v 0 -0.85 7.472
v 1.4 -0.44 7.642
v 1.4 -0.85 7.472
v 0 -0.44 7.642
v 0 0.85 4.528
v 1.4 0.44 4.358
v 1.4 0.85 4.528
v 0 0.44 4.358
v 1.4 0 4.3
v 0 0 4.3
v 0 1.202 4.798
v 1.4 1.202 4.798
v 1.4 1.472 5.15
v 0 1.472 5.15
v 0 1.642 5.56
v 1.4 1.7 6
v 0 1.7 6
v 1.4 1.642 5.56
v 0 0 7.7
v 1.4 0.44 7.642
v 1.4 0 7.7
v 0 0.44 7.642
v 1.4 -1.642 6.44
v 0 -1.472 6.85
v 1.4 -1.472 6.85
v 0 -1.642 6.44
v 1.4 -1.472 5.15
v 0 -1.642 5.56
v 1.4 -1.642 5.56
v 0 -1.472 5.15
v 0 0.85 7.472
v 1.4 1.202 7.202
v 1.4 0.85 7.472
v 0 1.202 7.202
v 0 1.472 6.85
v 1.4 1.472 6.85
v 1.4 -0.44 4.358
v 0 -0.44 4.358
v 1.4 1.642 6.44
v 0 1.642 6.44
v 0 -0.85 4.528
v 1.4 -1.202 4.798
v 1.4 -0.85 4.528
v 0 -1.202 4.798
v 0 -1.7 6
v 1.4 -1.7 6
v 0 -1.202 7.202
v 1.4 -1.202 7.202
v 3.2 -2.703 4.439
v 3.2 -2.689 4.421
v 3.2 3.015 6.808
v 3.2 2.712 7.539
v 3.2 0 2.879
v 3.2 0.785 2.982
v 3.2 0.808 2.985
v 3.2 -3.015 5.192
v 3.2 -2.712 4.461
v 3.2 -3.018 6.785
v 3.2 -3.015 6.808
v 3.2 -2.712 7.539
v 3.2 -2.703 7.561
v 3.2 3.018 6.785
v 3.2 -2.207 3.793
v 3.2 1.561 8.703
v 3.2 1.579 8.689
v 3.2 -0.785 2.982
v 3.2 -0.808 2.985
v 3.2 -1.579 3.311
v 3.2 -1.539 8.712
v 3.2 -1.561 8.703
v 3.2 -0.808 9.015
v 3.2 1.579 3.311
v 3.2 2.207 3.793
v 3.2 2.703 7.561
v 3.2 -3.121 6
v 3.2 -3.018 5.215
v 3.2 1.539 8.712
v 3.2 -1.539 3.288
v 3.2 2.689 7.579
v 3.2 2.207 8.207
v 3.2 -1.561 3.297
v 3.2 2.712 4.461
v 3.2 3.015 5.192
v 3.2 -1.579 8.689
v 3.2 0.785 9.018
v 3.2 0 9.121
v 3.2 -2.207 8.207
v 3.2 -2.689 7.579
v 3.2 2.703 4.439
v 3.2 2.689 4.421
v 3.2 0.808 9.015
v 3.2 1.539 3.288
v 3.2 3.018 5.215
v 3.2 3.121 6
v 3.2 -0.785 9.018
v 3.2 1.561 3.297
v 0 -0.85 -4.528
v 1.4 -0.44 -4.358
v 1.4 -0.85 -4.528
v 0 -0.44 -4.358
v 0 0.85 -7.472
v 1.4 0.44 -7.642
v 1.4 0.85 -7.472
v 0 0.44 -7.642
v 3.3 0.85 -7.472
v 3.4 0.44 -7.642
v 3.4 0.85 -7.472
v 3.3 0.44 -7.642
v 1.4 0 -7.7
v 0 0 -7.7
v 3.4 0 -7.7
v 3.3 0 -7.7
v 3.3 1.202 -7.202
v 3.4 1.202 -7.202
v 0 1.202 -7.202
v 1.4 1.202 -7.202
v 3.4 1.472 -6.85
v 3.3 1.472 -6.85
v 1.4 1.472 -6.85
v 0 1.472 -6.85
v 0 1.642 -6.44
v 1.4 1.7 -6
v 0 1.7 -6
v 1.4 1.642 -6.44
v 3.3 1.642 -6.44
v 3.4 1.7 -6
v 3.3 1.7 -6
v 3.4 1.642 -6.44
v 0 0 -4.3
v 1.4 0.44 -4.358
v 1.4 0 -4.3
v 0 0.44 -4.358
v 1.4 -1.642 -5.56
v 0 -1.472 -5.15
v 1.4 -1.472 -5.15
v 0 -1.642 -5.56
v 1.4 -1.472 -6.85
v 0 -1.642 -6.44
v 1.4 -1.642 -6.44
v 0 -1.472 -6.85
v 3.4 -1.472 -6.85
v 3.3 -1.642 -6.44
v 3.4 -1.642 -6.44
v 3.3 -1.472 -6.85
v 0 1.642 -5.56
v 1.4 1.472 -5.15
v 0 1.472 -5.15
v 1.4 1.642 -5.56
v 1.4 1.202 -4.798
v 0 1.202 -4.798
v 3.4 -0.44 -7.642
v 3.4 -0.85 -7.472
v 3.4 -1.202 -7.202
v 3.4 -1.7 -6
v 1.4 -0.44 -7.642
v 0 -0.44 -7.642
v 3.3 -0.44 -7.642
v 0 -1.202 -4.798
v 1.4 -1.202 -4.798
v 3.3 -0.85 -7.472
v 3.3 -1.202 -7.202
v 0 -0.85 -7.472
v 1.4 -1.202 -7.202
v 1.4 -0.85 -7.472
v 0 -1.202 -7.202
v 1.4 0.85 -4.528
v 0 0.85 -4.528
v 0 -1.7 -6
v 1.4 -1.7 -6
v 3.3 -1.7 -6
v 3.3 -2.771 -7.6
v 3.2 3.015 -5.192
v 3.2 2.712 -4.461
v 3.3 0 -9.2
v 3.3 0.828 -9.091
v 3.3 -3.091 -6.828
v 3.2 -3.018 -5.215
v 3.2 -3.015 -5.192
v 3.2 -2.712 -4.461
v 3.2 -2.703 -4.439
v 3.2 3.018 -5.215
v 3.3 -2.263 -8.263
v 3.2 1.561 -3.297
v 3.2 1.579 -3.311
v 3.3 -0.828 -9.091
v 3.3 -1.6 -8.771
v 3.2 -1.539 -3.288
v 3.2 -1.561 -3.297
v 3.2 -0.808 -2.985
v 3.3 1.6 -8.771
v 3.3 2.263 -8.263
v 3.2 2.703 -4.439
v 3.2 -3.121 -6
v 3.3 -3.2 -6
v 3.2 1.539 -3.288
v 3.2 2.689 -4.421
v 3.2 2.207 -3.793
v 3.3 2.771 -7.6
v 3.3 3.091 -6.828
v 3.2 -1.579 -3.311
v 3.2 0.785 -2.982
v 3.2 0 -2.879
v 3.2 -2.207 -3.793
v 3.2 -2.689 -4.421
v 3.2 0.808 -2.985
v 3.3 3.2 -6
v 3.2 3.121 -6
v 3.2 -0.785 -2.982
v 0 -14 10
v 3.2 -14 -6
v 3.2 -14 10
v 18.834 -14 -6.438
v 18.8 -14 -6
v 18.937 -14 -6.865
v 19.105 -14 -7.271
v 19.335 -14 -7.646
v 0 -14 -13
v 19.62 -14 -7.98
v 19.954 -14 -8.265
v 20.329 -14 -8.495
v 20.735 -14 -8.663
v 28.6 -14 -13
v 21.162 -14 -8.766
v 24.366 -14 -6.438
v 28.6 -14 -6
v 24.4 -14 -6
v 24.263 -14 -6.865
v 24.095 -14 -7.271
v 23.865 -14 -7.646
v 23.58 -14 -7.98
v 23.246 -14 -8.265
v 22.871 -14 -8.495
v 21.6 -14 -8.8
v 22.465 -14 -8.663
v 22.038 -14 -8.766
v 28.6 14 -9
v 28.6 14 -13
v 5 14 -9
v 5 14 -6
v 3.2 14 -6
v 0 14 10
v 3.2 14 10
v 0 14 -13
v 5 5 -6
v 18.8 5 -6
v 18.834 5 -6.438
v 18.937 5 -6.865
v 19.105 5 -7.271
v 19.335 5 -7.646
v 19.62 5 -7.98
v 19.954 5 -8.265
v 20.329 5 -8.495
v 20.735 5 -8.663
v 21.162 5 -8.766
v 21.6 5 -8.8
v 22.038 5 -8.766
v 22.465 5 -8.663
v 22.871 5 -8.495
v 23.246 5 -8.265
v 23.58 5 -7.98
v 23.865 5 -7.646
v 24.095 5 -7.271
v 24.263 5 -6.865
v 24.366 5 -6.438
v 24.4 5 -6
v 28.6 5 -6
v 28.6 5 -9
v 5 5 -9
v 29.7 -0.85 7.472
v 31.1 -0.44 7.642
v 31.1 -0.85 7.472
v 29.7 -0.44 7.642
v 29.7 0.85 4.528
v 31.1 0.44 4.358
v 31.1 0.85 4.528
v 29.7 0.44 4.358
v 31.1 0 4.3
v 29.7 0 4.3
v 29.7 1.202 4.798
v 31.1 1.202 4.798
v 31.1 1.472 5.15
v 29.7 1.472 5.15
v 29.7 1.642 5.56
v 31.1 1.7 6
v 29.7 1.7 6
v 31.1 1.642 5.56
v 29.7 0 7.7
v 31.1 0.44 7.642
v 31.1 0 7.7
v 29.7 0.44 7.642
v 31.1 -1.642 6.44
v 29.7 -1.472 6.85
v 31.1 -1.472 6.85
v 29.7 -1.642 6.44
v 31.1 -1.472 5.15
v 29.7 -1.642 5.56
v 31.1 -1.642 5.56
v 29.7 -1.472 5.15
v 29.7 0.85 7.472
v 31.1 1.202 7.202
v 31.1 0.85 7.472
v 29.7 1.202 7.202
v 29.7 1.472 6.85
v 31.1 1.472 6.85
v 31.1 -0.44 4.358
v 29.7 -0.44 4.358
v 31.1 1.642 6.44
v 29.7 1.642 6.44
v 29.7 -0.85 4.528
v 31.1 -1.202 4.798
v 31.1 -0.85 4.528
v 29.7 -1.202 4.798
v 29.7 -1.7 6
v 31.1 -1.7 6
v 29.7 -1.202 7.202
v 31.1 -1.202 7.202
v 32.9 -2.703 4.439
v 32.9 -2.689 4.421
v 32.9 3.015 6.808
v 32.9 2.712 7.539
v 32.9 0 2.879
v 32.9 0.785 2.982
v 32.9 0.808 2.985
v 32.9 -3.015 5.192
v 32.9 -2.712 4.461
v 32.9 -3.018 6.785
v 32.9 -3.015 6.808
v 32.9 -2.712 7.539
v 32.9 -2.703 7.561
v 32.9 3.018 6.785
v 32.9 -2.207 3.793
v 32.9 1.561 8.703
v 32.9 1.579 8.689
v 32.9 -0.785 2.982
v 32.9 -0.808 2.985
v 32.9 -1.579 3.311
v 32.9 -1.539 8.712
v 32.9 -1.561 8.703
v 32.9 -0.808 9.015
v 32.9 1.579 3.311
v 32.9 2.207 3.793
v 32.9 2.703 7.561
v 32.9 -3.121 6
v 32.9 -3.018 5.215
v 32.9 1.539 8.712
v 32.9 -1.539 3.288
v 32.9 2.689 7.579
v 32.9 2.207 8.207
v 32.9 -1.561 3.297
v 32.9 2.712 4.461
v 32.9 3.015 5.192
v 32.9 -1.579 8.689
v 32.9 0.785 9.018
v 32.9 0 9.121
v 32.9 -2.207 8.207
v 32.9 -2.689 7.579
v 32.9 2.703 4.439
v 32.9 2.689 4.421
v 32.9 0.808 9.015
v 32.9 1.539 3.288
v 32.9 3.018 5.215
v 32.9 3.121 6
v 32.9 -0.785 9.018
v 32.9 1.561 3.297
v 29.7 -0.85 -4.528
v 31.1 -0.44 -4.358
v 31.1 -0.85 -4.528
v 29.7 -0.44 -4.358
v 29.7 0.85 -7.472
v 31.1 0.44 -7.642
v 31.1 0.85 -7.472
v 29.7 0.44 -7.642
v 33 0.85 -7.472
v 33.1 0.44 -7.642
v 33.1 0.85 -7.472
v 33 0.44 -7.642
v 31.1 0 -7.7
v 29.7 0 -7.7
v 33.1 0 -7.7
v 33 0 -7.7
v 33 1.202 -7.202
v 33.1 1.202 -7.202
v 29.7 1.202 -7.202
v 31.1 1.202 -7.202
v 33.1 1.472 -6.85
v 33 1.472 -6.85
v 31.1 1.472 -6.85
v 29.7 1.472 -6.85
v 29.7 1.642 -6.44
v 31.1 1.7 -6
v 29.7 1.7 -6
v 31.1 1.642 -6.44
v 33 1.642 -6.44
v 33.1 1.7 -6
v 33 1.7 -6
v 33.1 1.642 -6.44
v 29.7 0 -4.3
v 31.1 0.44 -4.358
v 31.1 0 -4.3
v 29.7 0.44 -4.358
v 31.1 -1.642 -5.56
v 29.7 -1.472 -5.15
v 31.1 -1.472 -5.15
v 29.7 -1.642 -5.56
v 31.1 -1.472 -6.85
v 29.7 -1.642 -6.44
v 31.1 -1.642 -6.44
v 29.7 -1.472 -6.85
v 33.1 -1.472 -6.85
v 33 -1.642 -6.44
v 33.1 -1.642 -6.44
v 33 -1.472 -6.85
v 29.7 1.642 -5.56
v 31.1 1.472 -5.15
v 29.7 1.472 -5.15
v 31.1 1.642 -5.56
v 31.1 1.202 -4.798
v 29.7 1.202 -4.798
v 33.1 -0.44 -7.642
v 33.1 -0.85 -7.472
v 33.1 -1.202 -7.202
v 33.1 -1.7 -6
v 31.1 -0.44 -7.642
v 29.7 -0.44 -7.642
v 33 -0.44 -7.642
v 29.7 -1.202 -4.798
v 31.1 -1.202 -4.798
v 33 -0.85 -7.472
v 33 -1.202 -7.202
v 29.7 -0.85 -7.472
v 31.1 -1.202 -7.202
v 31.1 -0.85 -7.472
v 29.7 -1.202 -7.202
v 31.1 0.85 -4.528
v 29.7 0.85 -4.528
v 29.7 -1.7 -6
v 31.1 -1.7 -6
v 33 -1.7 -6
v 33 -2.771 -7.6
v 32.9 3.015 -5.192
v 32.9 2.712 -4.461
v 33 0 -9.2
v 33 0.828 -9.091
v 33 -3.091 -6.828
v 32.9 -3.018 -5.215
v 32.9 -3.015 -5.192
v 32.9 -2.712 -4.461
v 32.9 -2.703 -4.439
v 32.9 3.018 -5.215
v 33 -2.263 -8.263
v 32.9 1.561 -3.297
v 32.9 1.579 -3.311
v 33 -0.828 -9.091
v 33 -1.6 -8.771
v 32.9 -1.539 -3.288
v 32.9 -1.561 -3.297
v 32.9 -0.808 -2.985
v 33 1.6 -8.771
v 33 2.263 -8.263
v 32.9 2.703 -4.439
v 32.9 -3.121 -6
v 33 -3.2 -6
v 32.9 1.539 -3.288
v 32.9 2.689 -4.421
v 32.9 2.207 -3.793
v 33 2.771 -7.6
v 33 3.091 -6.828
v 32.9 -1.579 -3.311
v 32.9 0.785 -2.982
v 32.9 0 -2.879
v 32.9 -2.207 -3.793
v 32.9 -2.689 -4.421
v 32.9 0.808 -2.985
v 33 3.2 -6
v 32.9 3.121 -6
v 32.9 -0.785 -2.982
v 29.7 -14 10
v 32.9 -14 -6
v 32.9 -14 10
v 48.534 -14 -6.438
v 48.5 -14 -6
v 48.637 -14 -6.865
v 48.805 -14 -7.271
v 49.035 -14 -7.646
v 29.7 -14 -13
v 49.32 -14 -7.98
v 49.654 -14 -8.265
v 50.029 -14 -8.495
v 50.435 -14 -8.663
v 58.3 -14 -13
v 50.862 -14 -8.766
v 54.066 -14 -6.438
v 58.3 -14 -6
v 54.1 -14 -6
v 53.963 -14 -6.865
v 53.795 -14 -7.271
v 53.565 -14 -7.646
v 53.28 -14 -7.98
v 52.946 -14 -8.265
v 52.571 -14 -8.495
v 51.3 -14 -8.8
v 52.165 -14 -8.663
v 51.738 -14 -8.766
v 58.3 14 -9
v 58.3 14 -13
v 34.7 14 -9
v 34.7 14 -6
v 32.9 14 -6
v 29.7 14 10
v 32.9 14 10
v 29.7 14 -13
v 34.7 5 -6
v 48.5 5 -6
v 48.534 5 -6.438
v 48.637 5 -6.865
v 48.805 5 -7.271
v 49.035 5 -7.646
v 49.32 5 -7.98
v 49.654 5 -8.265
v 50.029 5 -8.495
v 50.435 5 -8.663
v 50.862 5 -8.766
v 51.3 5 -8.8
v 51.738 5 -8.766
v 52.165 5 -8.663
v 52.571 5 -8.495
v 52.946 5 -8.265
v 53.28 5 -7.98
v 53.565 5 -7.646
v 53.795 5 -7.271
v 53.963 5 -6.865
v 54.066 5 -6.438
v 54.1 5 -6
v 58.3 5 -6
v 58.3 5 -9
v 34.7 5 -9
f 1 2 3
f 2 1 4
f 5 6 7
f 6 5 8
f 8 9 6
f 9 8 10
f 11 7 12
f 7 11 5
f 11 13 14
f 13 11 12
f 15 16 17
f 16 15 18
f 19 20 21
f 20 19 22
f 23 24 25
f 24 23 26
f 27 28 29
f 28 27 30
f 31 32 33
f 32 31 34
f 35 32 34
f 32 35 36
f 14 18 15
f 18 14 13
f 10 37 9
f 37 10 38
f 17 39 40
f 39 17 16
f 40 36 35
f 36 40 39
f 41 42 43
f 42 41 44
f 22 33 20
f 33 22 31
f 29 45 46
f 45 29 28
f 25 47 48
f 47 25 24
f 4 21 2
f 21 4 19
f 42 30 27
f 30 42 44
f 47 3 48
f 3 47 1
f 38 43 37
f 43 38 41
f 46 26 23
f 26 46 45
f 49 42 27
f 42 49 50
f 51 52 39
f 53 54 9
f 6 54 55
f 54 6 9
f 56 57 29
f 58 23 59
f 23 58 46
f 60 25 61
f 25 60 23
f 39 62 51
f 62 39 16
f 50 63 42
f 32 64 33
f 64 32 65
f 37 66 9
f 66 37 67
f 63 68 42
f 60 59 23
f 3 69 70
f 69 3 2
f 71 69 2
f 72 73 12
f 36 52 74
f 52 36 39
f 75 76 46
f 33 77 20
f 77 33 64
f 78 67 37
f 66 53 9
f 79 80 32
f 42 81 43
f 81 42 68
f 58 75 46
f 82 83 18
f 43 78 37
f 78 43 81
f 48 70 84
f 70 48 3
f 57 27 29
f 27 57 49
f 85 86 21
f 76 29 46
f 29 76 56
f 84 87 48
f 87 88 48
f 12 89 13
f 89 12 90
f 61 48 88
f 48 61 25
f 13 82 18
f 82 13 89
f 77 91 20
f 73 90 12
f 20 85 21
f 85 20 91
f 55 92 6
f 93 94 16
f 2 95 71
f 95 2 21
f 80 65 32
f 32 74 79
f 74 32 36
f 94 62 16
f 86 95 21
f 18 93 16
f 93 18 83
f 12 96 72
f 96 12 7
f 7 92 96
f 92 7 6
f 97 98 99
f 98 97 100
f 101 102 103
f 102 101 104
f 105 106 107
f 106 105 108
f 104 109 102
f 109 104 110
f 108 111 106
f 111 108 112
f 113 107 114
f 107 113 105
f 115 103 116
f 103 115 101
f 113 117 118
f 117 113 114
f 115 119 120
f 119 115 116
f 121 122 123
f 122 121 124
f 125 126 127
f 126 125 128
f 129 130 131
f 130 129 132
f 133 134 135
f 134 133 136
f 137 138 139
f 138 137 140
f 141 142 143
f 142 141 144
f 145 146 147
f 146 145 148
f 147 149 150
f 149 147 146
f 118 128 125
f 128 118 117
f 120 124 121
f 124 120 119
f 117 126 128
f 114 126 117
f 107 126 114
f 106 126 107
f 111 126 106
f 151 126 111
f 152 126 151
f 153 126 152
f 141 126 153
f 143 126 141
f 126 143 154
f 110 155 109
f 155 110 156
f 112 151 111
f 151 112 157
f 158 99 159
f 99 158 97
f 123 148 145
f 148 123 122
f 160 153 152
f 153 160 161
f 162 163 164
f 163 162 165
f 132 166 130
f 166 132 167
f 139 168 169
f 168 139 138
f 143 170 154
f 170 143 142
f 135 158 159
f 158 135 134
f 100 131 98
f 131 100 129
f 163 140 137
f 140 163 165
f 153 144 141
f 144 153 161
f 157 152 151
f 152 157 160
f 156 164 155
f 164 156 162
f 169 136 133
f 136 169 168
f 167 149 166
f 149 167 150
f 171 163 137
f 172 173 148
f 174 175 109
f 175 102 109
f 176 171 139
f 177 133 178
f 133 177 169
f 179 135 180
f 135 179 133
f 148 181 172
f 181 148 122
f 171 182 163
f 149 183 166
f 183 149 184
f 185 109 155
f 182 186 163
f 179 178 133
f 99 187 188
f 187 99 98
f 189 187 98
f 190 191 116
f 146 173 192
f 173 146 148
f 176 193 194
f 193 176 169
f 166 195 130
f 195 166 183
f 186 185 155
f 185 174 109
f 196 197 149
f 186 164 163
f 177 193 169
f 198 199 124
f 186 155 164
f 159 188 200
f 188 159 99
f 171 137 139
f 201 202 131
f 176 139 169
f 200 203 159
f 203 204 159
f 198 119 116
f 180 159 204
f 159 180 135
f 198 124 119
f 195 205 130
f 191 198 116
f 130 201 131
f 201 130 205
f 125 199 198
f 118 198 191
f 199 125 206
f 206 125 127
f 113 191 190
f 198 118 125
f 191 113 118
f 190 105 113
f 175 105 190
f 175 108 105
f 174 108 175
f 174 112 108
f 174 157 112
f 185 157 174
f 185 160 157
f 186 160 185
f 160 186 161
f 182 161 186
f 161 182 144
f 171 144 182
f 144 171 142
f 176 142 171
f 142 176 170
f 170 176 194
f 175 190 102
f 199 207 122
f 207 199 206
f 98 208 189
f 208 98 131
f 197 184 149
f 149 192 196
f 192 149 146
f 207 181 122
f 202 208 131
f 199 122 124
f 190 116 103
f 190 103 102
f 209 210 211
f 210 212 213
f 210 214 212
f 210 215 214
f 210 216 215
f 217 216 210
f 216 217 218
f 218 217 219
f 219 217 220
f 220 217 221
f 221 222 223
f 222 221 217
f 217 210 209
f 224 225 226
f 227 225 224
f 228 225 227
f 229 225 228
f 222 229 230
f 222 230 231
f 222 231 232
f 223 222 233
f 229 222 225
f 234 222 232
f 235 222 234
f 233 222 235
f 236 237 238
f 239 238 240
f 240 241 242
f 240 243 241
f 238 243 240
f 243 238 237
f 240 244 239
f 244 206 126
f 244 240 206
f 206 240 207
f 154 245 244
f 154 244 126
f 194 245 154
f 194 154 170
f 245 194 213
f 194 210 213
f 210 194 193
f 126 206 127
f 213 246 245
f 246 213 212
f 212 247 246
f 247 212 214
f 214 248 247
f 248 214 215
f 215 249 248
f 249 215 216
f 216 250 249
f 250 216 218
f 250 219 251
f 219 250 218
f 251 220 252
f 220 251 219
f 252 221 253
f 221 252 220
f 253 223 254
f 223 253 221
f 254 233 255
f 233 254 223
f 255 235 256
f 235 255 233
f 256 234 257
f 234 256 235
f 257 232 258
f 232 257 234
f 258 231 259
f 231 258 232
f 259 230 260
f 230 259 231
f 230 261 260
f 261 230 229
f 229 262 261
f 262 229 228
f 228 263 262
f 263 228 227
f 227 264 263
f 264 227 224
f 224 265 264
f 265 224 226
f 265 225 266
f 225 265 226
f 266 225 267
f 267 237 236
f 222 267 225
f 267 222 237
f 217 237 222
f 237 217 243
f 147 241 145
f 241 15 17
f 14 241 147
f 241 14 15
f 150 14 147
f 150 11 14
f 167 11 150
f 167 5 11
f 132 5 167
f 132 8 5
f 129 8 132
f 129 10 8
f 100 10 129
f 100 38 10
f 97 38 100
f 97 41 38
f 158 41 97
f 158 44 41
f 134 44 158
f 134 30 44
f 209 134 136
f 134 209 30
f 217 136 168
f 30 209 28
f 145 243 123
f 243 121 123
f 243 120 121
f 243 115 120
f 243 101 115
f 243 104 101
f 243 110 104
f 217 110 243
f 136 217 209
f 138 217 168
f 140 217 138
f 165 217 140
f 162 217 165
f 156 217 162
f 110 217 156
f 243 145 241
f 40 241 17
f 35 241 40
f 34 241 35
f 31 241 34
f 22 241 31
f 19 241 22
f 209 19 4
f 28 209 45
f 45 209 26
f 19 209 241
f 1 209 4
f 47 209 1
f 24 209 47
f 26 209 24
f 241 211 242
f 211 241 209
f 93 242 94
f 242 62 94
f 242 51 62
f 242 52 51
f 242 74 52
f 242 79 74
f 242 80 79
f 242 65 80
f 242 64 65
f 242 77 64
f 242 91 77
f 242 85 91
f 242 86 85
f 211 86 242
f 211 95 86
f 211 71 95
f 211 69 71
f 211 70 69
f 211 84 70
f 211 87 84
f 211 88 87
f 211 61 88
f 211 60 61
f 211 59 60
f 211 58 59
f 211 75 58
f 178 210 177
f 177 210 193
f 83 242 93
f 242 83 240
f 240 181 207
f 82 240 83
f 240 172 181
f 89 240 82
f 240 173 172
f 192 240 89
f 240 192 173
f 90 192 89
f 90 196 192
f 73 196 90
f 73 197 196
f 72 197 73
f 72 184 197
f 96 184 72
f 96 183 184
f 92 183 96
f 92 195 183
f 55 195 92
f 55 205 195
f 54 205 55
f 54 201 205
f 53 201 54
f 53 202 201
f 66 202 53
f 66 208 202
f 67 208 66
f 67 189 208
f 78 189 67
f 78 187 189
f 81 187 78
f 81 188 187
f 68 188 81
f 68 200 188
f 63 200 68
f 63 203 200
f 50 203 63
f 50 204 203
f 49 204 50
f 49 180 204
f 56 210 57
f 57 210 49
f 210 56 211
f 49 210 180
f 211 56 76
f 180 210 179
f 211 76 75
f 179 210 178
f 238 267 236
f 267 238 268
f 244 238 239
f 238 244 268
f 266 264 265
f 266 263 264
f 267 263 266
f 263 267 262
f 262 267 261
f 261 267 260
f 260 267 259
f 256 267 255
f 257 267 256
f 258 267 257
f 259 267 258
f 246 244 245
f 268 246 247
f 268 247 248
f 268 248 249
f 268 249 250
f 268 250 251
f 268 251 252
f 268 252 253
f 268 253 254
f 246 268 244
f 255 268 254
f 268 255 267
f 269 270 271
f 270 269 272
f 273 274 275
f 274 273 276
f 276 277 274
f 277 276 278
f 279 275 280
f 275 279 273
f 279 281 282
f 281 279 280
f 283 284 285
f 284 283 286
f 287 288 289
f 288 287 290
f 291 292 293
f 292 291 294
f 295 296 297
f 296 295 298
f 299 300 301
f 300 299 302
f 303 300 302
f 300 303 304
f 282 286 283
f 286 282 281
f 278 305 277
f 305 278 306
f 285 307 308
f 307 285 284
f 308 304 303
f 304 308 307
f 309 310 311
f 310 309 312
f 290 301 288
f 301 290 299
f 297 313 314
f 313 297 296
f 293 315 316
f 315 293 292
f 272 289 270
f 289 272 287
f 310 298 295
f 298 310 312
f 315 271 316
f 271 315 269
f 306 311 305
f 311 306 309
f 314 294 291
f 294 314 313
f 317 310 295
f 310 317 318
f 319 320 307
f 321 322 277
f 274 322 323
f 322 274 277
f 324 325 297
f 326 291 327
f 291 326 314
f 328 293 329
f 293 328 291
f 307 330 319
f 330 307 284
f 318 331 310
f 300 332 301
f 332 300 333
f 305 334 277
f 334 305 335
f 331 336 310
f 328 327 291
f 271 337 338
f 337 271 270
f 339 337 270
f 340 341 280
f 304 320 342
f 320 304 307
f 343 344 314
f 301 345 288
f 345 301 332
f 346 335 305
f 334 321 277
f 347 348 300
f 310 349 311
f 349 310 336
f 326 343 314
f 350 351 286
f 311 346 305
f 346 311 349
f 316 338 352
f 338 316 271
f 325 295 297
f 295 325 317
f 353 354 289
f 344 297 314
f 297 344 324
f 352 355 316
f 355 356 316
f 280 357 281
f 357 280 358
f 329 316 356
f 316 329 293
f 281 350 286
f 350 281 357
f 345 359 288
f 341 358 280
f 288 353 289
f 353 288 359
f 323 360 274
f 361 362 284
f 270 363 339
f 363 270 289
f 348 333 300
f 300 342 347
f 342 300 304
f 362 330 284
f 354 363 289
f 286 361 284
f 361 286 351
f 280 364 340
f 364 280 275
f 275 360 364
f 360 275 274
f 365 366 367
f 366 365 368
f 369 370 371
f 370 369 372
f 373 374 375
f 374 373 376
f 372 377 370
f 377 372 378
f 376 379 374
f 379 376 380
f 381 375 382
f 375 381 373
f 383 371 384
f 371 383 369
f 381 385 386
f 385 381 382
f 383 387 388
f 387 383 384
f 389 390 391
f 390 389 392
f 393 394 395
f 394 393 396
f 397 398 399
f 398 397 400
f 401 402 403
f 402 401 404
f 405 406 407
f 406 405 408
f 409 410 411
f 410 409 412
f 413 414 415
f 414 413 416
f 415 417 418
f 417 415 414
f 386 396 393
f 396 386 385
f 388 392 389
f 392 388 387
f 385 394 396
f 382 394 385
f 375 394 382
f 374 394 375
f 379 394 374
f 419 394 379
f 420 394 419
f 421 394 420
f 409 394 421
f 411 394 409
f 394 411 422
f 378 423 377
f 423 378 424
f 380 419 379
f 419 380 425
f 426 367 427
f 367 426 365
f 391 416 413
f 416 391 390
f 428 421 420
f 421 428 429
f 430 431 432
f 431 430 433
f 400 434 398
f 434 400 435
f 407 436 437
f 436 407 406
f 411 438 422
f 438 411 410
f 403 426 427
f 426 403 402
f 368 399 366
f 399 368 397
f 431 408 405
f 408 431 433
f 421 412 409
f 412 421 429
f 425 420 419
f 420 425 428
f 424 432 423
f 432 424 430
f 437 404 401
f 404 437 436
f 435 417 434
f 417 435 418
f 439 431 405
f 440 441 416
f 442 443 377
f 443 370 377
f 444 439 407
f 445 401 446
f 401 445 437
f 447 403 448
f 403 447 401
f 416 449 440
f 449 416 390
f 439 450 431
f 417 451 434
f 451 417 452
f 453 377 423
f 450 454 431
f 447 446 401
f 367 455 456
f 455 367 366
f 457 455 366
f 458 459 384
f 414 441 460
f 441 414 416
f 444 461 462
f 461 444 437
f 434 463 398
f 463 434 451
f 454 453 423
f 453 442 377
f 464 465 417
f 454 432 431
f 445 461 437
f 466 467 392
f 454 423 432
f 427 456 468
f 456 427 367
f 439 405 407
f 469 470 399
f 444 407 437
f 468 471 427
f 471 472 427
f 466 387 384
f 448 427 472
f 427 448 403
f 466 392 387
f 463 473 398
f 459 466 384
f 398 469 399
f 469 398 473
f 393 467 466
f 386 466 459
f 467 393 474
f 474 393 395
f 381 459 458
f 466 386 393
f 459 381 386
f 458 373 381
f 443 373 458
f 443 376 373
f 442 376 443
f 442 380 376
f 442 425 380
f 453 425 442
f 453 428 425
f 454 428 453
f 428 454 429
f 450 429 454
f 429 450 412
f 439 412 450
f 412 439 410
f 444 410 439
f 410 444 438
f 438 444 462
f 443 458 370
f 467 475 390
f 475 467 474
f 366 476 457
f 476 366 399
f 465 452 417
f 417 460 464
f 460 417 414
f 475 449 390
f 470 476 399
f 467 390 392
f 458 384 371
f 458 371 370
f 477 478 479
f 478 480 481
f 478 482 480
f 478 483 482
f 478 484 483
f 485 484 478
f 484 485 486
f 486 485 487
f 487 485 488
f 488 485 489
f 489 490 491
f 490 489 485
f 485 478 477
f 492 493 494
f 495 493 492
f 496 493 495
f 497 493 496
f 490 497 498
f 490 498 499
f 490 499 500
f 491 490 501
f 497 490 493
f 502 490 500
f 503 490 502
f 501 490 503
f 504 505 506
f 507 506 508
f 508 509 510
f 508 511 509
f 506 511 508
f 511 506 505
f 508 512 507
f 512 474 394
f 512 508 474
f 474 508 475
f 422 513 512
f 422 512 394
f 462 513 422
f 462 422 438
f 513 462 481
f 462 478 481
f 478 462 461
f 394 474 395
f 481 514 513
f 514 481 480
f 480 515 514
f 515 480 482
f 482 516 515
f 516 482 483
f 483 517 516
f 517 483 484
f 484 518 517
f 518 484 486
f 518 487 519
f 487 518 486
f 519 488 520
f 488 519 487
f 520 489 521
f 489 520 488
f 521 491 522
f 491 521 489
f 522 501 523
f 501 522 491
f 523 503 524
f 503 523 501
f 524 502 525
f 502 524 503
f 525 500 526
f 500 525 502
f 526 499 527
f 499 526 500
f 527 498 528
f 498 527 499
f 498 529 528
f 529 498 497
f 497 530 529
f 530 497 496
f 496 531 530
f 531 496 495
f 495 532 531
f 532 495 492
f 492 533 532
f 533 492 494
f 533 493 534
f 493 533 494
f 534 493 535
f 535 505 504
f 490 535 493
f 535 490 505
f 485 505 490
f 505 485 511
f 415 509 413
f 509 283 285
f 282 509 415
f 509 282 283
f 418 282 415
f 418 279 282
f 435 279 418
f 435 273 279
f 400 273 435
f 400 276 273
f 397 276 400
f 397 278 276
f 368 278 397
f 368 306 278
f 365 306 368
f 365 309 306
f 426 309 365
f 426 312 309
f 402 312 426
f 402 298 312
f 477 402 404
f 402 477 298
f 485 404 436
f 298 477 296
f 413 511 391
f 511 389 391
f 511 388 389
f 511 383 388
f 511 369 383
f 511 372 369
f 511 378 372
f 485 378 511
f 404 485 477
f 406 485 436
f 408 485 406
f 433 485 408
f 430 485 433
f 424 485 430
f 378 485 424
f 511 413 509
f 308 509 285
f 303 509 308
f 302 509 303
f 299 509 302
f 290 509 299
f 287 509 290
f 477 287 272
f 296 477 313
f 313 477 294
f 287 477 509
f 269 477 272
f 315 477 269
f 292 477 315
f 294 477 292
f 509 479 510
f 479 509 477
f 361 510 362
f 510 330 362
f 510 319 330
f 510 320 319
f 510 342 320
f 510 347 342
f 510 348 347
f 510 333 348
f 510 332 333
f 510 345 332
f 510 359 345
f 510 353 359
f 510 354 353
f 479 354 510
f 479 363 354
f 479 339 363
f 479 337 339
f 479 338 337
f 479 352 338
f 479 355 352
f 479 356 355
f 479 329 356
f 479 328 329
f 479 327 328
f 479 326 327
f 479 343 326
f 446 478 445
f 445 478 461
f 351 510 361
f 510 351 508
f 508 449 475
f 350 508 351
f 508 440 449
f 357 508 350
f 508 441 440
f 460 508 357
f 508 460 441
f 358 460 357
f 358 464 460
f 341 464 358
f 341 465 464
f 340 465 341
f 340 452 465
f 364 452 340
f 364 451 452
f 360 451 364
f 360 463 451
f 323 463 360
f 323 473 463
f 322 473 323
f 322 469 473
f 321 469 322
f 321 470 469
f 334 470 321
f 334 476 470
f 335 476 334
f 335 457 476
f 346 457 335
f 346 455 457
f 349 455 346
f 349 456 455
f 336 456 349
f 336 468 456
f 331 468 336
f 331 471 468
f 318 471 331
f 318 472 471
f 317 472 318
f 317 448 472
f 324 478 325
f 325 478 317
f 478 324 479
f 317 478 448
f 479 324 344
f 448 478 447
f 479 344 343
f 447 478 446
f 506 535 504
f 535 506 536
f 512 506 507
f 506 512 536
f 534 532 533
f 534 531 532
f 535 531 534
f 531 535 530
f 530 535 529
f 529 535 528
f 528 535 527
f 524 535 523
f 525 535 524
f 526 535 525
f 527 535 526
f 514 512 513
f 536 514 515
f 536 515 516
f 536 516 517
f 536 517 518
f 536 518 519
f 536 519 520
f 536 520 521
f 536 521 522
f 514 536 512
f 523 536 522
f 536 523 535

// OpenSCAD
// ==============================================================================
// Padel Court Mesh Protective Mounting Hook System
// For Modular 7-Segment Scoreboard / Bambu Lab / FDM 3D Printing
// ==============================================================================
//
// Purpose:
// Mounts the modular 7-segment scoreboard safely on the BACK / OUTSIDE of the
// standard 50x50 mm padel court iron wire mesh fence.
// - The LED digits face INTO the court through the 50x50 mm square grid openings.
// - Padel balls hit the inside of the steel mesh, completely protecting the acrylic
//   diffusers, electronics, and digits from high-speed impact!
//
// Mounting Options Supported:
// 1. Top Seam Hook ("Hoekschroeven"): Mounts across the top seam (12.0 mm pitch)
//    between adjacent panels using M3 screws or tool-free M3 thumbscrews.
// 2. Top Corner Hook: Mounts to individual outer top corners (single M3 hole).
// 3. VESA 50x50 Over-the-Top Hook: Bolts to the 50x50 mm VESA pattern on the back
//    of any digit, extending a rigid truss arm up and over the top panel edge.
//
// Printing & Strength:
// - All hook profiles are designed to print FLAT ON THEIR SIDE on the print bed.
// - This aligns the FDM continuous extrusion layer lines along the tensile load
//   path of the hook, giving 100% resistance against layer-shear and ball vibrations!
// ==============================================================================

/* [Configuration & Part Selection] */
part = 1; // [1:"seam_pair - Pair of Top Seam Hooks (12mm pitch across panel joints)", 2:"corner_pair - Pair of Single Top Corner Hooks", 3:"vesa_hook - VESA 50x50 Over-the-Top Hook", 4:"seam_single - 1 Top Seam Hook", 5:"corner_single - 1 Top Corner Hook", 6:"preview_seam - 3D Preview: Panel on Padel Wire Mesh with Seam Hook", 7:"preview_vesa - 3D Preview: Panel on Padel Wire Mesh with VESA Hook"]

/* [Padel Wire Mesh Parameters (Standard FIP)] */
mesh_pitch      = 50.0; // Standard 50x50 mm wire grid
wire_d          = 4.2;  // Steel wire diameter (supports 3.5mm to 5.0mm)
throat_d        = 5.6;  // Hook throat diameter (smooth drop/snap over wire)
hook_lip_depth  = 16.0; // Downward retention lip depth (prevents jumping on ball impact)
entry_flare     = 8.5;  // Flared mouth width for effortless alignment onto wire

/* [Display Panel Sizing (from 7segment_pogo.scad)] */
panel_thick     = 18.5; // Total depth of panel (13.0mm frontplate + 5.5mm backplate)
top_screw_y_off = 6.0;  // Top M3 screw hole distance from top panel rim (Y = 109.2 vs 115.2)
seam_pitch      = 12.0; // Pitch between screws across seam (X = +/-6.0 mm)
bracket_t       = 3.2;  // Base plate thickness (matches rear joining bracket)

/* [Print Resolution] */
$fn = 40;

// ==============================================================================
// 2D HOOK PROFILE (Side View: Y-Z Plane)
// ==============================================================================
// Origin (0,0) is at the rear mounting face (Z = 0) at the M3 screw hole center (Y = 0)
// Panel top rim is at Y = +top_screw_y_off (6.0 mm)
// Panel front face is at Z = +panel_thick (18.5 mm)
// Hook reaches up past Y = top_screw_y_off, forward to Z = panel_thick + wire_d/2,
// and drops down in front of the wire.

hook_arm_t = 4.2; // Structural thickness of the hook arm
front_clearance = 1.0; // Gap between front of panel and wire mesh

module hook_side_profile_2d() {
    wire_center_z = panel_thick + front_clearance + wire_d/2; // Z position of wire center (~21.6 mm)
    hook_top_y    = top_screw_y_off + throat_d/2 + hook_arm_t; // Highest point of hook (~13.0 mm)
    
    difference() {
        // Outer continuous solid profile
        polygon([
            // Base plate on rear of panel
            [0, -10.0],                          // Bottom of base plate
            [bracket_t, -10.0],                  // Base plate thickness
            [bracket_t, top_screw_y_off],        // Rises to top rim of panel
            
            // Forward bridge reaching over the top of the panel
            [wire_center_z, top_screw_y_off],
            [wire_center_z + throat_d/2 + hook_arm_t, top_screw_y_off],
            [wire_center_z + throat_d/2 + hook_arm_t, hook_top_y],
            [0, hook_top_y],                     // Top rear corner
        ]);
        
        // Subtract: Wire seating pocket (centered at wire_center_z)
        translate([wire_center_z, top_screw_y_off])
            circle(d = throat_d);
            
        // Subtract: Entry throat slot angled downwards for slide-in entry
        translate([wire_center_z - throat_d/2, -1.0])
            square([throat_d, top_screw_y_off + 1.0]);
            
        // Subtract: Flared lead-in mouth at bottom of front lip
        polygon([
            [wire_center_z - throat_d/2 - 2.0, -1.1],
            [wire_center_z + throat_d/2 + 4.0, -1.1],
            [wire_center_z + throat_d/2, 3.5],
            [wire_center_z - throat_d/2, 3.5]
        ]);
    }
}

// ------------------------------------------------------------------------------
// 1. TOP SEAM HOOK BRACKET (12.0 mm Hole Pitch)
// ------------------------------------------------------------------------------
// Mounts across the top seam between two panels. Replaces or bolts over the top
// seam bracket. Width = 28.0 mm (spans X = -14 to +14 mm).
module seam_hook_bracket() {
    bracket_w = 28.0;
    
    difference() {
        // Extrude the 2D hook profile along X
        rotate([0, -90, -90])
            linear_extrude(height = bracket_w, center = true)
                hook_side_profile_2d();
                
        // 2x Countersunk M3 screw holes at X = +/- 6.0 mm (seam pitch = 12.0 mm)
        for (x = [-seam_pitch/2, seam_pitch/2]) {
            translate([x, -top_screw_y_off + top_screw_y_off, -0.1]) {
                // Main M3 clearance hole (3.4 mm)
                cylinder(h = bracket_t + 0.3, d = 3.4, $fn = 24);
                // 90-degree countersink for flathead screw or thumbscrew seating
                translate([0, 0, bracket_t - 1.8 + 0.1])
                    cylinder(h = 1.9, d1 = 3.4, d2 = 6.4, $fn = 24);
            }
        }
        
        // Central clearance notch between hook prongs (reduces weight, fits vertical mesh wire)
        translate([-bracket_w/2 + 5.0, top_screw_y_off - 1.0, 5.0])
            cube([bracket_w - 10.0, 20.0, panel_thick + 10.0]);
    }
}

// ------------------------------------------------------------------------------
// 2. TOP CORNER HOOK BRACKET (Single M3 Hole)
// ------------------------------------------------------------------------------
// Mounts to any outer top corner M3 screw hole. Width = 15.0 mm.
module corner_hook_bracket() {
    bracket_w = 15.0;
    
    difference() {
        // Extrude profile
        rotate([0, -90, -90])
            linear_extrude(height = bracket_w, center = true)
                hook_side_profile_2d();
                
        // Single central M3 countersunk hole at (0, 0)
        translate([0, 0, -0.1]) {
            cylinder(h = bracket_t + 0.3, d = 3.4, $fn = 24);
            translate([0, 0, bracket_t - 1.8 + 0.1])
                cylinder(h = 1.9, d1 = 3.4, d2 = 6.4, $fn = 24);
        }
        
        // Outer corner chamfer
        translate([-bracket_w/2 - 0.1, -10.1, -0.1])
            cube([3.0, 5.0, bracket_t + 1.0]);
    }
}

// ------------------------------------------------------------------------------
// 3. VESA 50x50 OVER-THE-TOP HOOK BRACKET
// ------------------------------------------------------------------------------
// Mounts to the 4 VESA holes (50x50 mm) in the center of any digit.
// An upright truss arm reaches 95 mm up over the top panel rim and hooks the wire.
module vesa_mesh_hook() {
    vesa_p = 50.0;
    vesa_plate_w = 64.0;
    vesa_plate_h = 64.0;
    vesa_t = 3.5;
    reach_up = 115.2 - 25.0 + 5.0; // 95.2 mm from top VESA holes (Y = 25) to top rim (Y = 115.2)
    wire_z = panel_thick + front_clearance + wire_d/2;
    
    difference() {
        union() {
            // 1. Base plate covering 50x50 VESA pattern
            translate([0, 0, vesa_t/2])
                hull() {
                    for (x = [-vesa_plate_w/2 + 4, vesa_plate_w/2 - 4]) {
                        for (y = [-vesa_plate_h/2 + 4, vesa_plate_h/2 - 4]) {
                            translate([x, y, 0])
                                cylinder(h = vesa_t, r = 4.0, center = true, $fn = 24);
                        }
                    }
                }
                
            // 2. Upright truss arm extending from VESA plate over top of panel
            translate([0, reach_up/2 + 25.0, vesa_t/2])
                cube([20.0, reach_up, vesa_t], center = true);
                
            // Triangular stiffening ribs along upright arm
            for (x = [-8.0, 8.0]) {
                translate([x, 25.0, vesa_t])
                    rotate([0, 90, 0])
                        linear_extrude(height = 3.0, center = true)
                            polygon([[0, 0], [reach_up, 0], [0, 10.0]]);
            }
            
            // 3. Forward over-the-top hook at top of truss arm
            translate([0, 115.2, 0]) {
                // Horizontal bridge across top of panel
                translate([0, 0, wire_z/2])
                    cube([24.0, 8.0, wire_z], center = true);
                    
                // Front hook drop with wire pocket
                translate([0, -throat_d/2 - 2.0, wire_z])
                    difference() {
                        cube([24.0, hook_lip_depth + 4.0, 6.0], center = true);
                        // Wire cylinder
                        translate([0, -hook_lip_depth/2 + throat_d/2 + 2.0, 0])
                            cylinder(h = 10.0, d = throat_d, center = true, $fn = 30);
                    }
            }
        }
        
        // 4x VESA M3 mounting holes
        for (x = [-vesa_p/2, vesa_p/2]) {
            for (y = [-vesa_p/2, vesa_p/2]) {
                translate([x, y, -0.1]) {
                    cylinder(h = vesa_t + 0.3, d = 3.4, $fn = 24);
                    // Counterbore for screw head
                    translate([0, 0, vesa_t - 2.0 + 0.1])
                        cylinder(h = 2.1, d = 6.4, $fn = 24);
                }
            }
        }
        
        // Center weight relief hole
        translate([0, 0, -0.1])
            cylinder(h = vesa_t + 0.3, d = 20.0, $fn = 36);
    }
}

// ------------------------------------------------------------------------------
// PRINT BED LAYOUTS (Oriented Flat for Optimal Layer Strength)
// ------------------------------------------------------------------------------
// Seam Hook Pair (laid flat on side for 100% tensile strength along hook curve)
module seam_hook_pair_on_bed() {
    // 1st Hook laid flat
    rotate([0, 90, 0])
        seam_hook_bracket();
        
    // 2nd Hook laid flat beside it
    translate([bracket_t + panel_thick + 8.0, 0, 0])
        rotate([0, 90, 0])
            seam_hook_bracket();
}

// Corner Hook Pair
module corner_hook_pair_on_bed() {
    rotate([0, 90, 0])
        corner_hook_bracket();
    translate([bracket_t + panel_thick + 8.0, 0, 0])
        rotate([0, 90, 0])
            corner_hook_bracket();
}

// ------------------------------------------------------------------------------
// ASSEMBLED 3D PREVIEW (Scoreboard behind Padel Court Iron Mesh)
// ------------------------------------------------------------------------------
module padel_mesh_wire_grid(w = 260, h = 300) {
    color("#94a3b8", 0.9) { // Steel galvanized wire
        // Horizontal wires
        for (y = [-h/2 : mesh_pitch : h/2]) {
            translate([0, y, 0])
                rotate([0, 90, 0])
                    cylinder(h = w, d = wire_d, center = true, $fn = 20);
        }
        // Vertical wires
        for (x = [-w/2 : mesh_pitch : w/2]) {
            translate([x, 0, 0])
                cylinder(h = h, d = wire_d, center = true, $fn = 20);
        }
    }
}

module padel_ball_sim(pos = [0, 0, 0]) {
    color("#eab308") // Tennis/Padel optic yellow
        translate(pos)
            sphere(d = 66.0, $fn = 30); // 66 mm diameter ball
}

module assembled_preview(use_vesa = false) {
    wire_z = panel_thick + front_clearance + wire_d/2;
    
    // 1. Padel Court Steel Wire Mesh (in front at Z = wire_z)
    translate([0, 115.2, wire_z])
        padel_mesh_wire_grid(w = 320, h = 320);
        
    // 2. Incoming Padel Ball (bouncing off front of mesh, cannot touch display!)
    padel_ball_sim([40.0, 60.0, wire_z + 45.0]);
    
    // 3. Simulated 7-Segment Display Panel (Dark Slate Body)
    color("#1e293b", 0.85) {
        translate([0, 0, panel_thick/2])
            cube([138.4, 230.4, panel_thick], center = true);
    }
    
    // Glowing LED segments preview (White/Cyan)
    color("#38bdf8") {
        translate([0, 0, panel_thick + 0.1])
            linear_extrude(0.6) {
                // Segment 8 shape preview
                for (y = [-92, 0, 92]) translate([0, y]) square([70, 14], center = true);
                for (x = [-46, 46]) {
                    translate([x, 46]) square([14, 70], center = true);
                    translate([x, -46]) square([14, 70], center = true);
                }
            }
    }
    
    // 4. Mounting Hooks
    if (!use_vesa) {
        // Top Seam Hook mounted over top edge
        color("#0284c7")
            translate([0, 109.2, 0])
                seam_hook_bracket();
    } else {
        // VESA 50x50 Hook mounted in center of backplate
        color("#0284c7")
            translate([0, 0, -bracket_t])
                vesa_mesh_hook();
    }
}

// ==============================================================================
// TOP-LEVEL SELECTOR
// ==============================================================================
if (part == 1 || part == "seam_pair") {
    seam_hook_pair_on_bed();
} else if (part == 2 || part == "corner_pair") {
    corner_hook_pair_on_bed();
} else if (part == 3 || part == "vesa_hook") {
    vesa_mesh_hook();
} else if (part == 4 || part == "seam_single") {
    seam_hook_bracket();
} else if (part == 5 || part == "corner_single") {
    corner_hook_bracket();
} else if (part == 6 || part == "preview_seam") {
    assembled_preview(use_vesa = false);
} else if (part == 7 || part == "preview_vesa") {
    assembled_preview(use_vesa = true);
}
